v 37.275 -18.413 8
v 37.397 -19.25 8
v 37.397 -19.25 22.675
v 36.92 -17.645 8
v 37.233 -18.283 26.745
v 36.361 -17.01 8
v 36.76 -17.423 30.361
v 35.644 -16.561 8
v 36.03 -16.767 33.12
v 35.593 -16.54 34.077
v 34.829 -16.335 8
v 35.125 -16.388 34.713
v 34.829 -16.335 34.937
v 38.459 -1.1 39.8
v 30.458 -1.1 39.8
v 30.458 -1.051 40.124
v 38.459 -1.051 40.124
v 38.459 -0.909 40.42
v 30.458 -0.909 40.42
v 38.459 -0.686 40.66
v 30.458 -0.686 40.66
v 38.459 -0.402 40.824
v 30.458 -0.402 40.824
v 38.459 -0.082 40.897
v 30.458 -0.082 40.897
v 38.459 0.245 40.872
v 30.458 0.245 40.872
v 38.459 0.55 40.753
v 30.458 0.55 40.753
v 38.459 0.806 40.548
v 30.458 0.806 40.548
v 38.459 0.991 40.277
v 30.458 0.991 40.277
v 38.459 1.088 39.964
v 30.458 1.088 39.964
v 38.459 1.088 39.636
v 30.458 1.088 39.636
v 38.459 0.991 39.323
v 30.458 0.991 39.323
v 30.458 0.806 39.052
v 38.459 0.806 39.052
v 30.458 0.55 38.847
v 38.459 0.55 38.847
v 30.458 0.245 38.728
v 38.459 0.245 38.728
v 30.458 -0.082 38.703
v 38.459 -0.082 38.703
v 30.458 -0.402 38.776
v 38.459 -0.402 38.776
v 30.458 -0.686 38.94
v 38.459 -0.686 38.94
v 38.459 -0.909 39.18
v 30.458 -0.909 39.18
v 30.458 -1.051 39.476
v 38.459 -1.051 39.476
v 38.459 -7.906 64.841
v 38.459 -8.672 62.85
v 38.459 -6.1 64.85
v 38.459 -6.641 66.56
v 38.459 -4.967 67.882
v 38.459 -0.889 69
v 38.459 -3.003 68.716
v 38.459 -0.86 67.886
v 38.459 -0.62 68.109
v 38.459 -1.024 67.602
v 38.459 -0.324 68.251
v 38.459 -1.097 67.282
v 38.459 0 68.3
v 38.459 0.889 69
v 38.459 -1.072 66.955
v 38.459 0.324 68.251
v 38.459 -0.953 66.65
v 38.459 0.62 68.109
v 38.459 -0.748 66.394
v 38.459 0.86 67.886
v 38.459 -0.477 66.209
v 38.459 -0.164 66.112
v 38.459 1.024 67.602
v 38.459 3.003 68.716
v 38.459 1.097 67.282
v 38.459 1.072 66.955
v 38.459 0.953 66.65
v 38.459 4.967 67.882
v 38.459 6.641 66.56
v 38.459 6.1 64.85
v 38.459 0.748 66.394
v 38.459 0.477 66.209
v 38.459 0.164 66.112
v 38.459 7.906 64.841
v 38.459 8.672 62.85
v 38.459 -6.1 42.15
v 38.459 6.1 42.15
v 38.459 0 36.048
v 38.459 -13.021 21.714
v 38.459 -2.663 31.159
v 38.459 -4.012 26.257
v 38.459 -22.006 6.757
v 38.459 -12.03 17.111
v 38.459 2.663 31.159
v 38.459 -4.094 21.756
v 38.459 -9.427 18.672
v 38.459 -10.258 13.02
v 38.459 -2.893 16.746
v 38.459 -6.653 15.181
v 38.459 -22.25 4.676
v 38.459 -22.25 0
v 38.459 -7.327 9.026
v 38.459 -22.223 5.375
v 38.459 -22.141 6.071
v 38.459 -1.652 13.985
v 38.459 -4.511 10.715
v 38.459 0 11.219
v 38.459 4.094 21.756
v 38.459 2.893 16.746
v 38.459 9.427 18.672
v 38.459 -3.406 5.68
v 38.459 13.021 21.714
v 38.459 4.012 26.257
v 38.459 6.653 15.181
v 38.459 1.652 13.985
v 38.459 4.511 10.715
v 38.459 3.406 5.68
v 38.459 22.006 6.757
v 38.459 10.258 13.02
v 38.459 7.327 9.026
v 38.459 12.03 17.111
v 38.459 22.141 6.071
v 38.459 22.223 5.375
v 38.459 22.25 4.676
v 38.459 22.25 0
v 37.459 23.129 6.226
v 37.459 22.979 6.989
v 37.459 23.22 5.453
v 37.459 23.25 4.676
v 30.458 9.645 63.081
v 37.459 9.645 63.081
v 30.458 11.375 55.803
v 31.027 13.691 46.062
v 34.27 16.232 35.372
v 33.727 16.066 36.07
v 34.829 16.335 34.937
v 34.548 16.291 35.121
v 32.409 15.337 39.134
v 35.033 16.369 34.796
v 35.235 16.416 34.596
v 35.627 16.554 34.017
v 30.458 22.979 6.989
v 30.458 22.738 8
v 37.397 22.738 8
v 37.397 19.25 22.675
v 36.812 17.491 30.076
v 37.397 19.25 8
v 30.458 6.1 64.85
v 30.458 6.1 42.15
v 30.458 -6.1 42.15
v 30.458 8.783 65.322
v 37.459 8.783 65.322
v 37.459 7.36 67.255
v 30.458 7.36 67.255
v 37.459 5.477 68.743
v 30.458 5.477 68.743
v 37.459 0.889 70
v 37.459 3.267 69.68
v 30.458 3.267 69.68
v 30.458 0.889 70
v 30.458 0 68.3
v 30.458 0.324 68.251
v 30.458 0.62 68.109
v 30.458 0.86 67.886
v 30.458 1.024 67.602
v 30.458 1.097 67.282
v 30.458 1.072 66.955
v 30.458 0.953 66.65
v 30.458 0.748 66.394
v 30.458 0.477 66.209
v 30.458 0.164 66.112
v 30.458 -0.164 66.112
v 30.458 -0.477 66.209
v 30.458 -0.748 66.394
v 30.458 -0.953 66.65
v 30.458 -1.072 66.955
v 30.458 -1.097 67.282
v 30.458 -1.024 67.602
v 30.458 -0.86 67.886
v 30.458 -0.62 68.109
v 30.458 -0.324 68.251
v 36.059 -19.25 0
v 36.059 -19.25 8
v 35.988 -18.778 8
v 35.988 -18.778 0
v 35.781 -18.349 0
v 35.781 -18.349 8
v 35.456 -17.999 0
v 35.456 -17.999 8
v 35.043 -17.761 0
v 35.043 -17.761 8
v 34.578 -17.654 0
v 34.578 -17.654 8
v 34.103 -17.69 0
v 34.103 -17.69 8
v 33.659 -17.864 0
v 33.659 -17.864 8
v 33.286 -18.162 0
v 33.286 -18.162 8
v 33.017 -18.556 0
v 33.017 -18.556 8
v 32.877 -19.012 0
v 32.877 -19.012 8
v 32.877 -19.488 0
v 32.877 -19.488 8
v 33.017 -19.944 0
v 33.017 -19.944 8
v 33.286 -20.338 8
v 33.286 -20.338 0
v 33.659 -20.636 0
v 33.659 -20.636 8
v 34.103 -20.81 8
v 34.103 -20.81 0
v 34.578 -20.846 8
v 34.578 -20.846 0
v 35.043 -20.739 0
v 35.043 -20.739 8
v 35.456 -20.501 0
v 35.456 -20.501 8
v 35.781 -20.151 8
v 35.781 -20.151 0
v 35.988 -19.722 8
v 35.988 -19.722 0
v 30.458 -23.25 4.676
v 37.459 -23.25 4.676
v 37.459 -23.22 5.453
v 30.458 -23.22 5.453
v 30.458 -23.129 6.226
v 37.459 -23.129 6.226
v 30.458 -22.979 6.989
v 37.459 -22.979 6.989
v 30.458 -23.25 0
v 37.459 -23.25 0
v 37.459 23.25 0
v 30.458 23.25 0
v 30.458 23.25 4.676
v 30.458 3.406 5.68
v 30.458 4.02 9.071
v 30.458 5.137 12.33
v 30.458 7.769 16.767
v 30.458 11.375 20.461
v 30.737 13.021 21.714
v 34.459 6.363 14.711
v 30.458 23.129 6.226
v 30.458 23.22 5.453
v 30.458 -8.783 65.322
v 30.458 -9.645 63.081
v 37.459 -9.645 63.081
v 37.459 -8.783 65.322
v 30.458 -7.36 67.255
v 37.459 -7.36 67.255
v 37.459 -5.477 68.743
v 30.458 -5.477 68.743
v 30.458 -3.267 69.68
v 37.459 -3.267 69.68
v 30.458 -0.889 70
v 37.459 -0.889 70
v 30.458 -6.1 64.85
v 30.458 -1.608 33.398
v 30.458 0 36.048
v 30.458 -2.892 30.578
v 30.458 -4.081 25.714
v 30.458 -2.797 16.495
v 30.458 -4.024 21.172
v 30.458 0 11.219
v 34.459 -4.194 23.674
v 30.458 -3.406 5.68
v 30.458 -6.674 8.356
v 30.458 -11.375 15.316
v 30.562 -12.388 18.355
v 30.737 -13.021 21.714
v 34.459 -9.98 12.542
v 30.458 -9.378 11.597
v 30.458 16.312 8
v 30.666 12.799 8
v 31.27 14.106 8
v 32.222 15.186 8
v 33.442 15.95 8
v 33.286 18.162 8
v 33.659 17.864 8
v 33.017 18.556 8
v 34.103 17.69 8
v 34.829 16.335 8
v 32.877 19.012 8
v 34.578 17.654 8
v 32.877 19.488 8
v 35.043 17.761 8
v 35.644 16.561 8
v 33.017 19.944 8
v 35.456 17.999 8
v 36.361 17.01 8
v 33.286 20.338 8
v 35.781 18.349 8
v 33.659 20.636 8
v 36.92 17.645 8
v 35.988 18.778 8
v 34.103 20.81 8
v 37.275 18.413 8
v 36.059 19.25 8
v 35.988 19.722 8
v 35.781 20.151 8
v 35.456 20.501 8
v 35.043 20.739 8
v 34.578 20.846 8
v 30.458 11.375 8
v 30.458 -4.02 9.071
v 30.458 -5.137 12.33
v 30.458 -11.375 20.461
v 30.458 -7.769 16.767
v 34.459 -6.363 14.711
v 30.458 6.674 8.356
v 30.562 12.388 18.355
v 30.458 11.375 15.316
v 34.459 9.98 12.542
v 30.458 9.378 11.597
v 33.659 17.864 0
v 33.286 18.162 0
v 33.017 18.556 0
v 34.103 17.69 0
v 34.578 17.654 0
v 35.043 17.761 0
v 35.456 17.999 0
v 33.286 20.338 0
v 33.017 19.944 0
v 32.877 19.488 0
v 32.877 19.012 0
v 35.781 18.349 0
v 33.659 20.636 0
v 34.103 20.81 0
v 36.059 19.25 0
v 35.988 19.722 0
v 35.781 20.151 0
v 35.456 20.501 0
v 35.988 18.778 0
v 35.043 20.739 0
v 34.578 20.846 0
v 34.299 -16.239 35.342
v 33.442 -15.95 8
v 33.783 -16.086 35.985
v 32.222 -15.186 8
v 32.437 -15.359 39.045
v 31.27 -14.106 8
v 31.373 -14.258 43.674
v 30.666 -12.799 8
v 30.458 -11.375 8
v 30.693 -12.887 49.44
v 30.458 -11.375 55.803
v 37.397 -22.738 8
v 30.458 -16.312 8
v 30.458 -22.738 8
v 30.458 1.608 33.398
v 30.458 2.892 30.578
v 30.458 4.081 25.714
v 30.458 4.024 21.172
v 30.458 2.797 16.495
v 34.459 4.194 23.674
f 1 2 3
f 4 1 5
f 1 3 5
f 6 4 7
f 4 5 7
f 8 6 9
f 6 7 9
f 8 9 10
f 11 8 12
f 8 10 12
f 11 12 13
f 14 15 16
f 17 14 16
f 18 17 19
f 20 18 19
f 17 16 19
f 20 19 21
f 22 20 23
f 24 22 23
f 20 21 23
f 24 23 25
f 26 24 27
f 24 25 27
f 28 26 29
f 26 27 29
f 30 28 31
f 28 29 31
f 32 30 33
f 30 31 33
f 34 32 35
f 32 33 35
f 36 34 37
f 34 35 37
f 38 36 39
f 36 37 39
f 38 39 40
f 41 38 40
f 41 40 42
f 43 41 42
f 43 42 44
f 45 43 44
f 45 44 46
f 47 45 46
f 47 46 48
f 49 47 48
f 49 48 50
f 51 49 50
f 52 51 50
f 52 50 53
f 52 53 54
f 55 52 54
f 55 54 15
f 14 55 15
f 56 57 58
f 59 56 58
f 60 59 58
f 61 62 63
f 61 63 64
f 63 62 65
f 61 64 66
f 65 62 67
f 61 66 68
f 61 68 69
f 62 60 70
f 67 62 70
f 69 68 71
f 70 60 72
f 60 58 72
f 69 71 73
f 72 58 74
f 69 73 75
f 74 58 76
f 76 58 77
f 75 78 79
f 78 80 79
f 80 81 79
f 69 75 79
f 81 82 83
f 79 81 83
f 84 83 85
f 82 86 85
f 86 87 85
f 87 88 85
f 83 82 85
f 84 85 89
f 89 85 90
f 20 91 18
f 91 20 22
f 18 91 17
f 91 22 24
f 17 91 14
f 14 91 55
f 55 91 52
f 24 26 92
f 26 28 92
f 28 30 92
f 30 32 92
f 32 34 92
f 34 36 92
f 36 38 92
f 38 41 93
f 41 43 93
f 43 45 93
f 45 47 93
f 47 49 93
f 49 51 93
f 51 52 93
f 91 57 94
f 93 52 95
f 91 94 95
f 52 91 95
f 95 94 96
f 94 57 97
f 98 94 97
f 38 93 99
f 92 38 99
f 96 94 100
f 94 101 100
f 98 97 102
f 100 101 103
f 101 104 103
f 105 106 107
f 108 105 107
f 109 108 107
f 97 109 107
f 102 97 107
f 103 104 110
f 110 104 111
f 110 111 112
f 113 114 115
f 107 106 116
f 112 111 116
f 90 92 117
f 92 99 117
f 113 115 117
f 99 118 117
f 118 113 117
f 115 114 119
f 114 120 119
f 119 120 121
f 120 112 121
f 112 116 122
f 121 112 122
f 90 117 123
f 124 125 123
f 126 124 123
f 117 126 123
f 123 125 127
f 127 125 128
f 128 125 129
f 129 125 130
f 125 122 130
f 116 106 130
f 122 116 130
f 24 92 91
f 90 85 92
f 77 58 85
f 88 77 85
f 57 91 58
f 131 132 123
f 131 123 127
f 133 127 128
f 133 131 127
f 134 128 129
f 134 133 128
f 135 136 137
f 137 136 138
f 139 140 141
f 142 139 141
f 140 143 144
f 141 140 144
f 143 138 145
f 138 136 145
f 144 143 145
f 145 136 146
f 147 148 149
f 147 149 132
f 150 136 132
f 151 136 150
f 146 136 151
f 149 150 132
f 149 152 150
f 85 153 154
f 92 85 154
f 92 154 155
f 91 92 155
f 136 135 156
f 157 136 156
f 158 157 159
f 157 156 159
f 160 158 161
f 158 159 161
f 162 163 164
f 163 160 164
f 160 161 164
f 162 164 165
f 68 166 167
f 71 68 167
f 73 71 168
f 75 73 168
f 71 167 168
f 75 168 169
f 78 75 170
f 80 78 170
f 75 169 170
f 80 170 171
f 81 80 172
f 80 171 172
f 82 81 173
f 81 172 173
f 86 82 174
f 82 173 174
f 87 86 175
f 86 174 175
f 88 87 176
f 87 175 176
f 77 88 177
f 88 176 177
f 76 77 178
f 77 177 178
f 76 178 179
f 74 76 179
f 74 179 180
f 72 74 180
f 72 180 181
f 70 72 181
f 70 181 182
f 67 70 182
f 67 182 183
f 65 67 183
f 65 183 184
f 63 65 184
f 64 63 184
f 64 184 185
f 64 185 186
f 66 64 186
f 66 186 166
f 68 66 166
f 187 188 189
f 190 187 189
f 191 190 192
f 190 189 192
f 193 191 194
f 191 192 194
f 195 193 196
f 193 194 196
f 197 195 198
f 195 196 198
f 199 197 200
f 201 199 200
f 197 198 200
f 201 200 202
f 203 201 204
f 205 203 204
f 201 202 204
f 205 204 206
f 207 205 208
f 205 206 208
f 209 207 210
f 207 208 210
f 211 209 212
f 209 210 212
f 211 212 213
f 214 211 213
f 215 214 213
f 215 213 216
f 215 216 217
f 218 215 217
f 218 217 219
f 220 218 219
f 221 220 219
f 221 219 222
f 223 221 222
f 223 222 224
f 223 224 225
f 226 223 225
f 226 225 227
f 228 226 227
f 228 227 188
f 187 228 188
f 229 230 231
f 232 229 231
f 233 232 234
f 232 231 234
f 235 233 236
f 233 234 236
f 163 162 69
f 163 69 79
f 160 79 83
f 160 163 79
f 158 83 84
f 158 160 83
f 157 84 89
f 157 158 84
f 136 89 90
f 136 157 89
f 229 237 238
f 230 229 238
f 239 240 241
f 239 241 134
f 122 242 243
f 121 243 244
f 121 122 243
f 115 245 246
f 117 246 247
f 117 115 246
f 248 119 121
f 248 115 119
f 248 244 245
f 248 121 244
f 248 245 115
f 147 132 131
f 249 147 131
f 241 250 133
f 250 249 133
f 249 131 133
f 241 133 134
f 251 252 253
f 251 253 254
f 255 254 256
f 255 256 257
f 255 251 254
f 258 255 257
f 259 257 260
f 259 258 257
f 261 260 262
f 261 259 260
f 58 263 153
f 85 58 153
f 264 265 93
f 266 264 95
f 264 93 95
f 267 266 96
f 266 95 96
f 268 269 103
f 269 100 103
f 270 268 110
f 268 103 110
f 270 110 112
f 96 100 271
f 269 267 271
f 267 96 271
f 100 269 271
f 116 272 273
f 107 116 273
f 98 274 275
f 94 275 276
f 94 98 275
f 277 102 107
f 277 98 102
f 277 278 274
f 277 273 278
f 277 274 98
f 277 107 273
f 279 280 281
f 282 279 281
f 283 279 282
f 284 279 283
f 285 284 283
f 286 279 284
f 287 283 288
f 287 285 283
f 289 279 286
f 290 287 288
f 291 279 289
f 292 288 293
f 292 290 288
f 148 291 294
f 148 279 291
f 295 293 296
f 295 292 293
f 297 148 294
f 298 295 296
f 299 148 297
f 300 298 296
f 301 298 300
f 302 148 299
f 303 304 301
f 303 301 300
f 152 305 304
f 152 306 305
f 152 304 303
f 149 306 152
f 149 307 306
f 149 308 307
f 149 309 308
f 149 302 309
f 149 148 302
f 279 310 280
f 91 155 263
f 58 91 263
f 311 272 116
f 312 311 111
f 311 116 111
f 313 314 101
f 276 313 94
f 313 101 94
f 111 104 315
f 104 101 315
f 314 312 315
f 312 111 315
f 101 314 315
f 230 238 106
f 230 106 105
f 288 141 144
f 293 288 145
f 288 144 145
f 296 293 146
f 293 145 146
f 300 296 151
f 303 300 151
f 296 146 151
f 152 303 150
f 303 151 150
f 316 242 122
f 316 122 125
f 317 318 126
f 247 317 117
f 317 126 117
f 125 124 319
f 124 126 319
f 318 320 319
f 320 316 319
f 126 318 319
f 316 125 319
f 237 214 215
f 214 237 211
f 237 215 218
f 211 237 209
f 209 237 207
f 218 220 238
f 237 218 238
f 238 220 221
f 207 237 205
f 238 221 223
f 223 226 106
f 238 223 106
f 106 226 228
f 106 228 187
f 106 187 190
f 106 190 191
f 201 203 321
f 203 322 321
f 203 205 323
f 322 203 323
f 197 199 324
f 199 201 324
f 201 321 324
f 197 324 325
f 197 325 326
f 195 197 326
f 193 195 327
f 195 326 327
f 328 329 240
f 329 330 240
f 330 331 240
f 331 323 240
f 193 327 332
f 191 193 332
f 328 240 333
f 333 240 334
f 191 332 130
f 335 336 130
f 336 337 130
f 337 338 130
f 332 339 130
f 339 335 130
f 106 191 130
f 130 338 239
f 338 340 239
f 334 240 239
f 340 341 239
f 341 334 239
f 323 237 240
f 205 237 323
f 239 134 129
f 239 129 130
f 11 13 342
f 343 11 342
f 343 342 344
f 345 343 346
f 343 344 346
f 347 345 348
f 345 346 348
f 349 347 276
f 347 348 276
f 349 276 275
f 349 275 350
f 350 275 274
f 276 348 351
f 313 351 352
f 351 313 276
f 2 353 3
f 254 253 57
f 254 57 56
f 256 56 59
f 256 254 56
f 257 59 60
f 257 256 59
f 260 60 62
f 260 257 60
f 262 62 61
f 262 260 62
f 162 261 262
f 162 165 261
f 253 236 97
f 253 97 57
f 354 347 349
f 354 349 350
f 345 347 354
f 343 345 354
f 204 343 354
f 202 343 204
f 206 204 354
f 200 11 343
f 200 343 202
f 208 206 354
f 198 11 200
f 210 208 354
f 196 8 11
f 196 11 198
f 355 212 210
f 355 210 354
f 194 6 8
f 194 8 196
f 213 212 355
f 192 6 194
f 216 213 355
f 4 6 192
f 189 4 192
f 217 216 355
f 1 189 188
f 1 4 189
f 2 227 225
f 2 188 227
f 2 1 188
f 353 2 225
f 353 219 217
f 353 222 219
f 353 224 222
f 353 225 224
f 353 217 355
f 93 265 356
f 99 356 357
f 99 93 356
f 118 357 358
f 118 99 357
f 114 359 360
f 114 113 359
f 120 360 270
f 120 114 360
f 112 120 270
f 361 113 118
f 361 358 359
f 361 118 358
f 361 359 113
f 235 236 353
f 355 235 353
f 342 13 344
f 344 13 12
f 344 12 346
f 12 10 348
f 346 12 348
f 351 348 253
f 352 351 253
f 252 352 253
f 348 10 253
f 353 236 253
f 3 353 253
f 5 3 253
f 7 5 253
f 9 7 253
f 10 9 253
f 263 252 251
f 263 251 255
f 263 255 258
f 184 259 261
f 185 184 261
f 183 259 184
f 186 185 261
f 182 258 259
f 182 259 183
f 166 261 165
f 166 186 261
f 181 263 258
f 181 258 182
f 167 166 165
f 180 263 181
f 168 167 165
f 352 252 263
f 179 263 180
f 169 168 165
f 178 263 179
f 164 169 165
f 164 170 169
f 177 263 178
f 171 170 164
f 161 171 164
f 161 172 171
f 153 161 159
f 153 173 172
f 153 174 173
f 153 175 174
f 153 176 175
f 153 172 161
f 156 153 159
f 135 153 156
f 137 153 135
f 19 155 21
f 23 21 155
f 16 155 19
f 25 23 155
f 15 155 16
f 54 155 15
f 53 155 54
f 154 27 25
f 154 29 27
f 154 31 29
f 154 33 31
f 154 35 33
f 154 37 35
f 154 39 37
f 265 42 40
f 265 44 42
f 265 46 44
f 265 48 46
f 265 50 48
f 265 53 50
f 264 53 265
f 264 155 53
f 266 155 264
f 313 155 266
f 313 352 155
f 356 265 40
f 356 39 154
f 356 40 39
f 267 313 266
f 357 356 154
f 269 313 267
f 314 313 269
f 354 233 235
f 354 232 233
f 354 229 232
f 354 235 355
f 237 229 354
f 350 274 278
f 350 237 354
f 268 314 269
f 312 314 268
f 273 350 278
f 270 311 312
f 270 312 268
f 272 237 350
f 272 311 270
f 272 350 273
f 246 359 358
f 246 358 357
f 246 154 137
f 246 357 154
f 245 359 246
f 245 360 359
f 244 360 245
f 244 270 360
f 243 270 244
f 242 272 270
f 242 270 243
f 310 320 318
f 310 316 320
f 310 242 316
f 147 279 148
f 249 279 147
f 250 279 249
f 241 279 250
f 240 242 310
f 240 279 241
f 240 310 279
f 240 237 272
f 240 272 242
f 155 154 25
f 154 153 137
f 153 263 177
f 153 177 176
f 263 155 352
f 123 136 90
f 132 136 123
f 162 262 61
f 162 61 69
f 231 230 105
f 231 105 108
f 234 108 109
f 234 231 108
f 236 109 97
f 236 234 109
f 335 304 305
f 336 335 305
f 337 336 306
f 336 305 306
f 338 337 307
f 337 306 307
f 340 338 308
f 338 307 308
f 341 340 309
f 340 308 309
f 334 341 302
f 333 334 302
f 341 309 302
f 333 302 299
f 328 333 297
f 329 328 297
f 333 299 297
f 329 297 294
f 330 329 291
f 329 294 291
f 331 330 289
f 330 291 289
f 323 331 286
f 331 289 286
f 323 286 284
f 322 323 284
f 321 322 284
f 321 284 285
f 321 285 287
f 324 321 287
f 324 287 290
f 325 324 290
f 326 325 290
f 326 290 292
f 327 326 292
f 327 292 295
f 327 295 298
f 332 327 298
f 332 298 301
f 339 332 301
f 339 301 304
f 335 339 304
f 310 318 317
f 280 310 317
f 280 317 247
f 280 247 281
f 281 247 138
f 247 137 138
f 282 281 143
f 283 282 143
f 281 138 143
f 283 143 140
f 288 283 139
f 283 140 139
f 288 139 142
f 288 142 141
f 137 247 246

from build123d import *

# Parameters (mm, degrees)
SKETCH1_W           = 8.000974829
SKETCH1_H           = 46.5
BOSS_EXTRUDE1_DEPTH = 70
CUT_EXTRUDE1_DEPTH  = 70
SKETCH3_R           = 1.1
CUT_EXTRUDE2_DEPTH  = 70
FILLET1_R           = 9
CUT_EXTRUDE3_DEPTH  = 62
SKETCH5_R           = 1.6
CUT_EXTRUDE4_DEPTH  = 62
FILLET2_R           = 5
CHAMFER1_SIZE       = 1


with BuildPart() as part:
    # Sketch1 → Boss-Extrude1 (new body)
    with BuildSketch(Plane.XY):
        with Locations((34.458782271, 0)):
            Rectangle(SKETCH1_W, SKETCH1_H)
    extrude(amount=BOSS_EXTRUDE1_DEPTH)

    # Sketch2 → Cut-Extrude1 (cut)
    with BuildSketch(Plane(origin=(38.459269685, 0, 0), x_dir=(0, 0, -1), z_dir=(1, 0, 0))):
        with BuildLine():
            Line((0, -23.25), (-4.675968949, -23.25))
            ThreePointArc((-4.675968949, -23.25), (-5.84025075, -23.181991134), (-6.988696254, -22.978889578))
            Line((-6.988696254, -22.978889578), (-70, -8))
            Line((-70, -8), (-70, 0))
            Line((-70, 0), (-70, 8))
            Line((-70, 8), (-6.988696254, 22.978889578))
            ThreePointArc((-6.988696254, 22.978889578), (-5.84025075, 23.181991134), (-4.675968949, 23.25))
            Line((-4.675968949, 23.25), (0, 23.25))
            Line((0, 23.25), (0, 33.462731107))
            Line((0, 33.462731107), (-74.824697051, 33.462731107))
            Line((-74.824697051, 33.462731107), (-74.824697051, -41.354226456))
            Line((-74.824697051, -41.354226456), (0, -41.354226456))
            Line((0, -41.354226456), (0, -23.25))
        make_face()
        with BuildLine():
            add(Edge.make_bspline(
                [(-36.048150351, 0), (-23.713645553, -8.388071288), (-11.218940507, 0)],
                knots=[0, 0, 0, 1, 1, 1], degree=2))
            add(Edge.make_bspline(
                [(-36.048150351, 0), (-23.713645553, 8.388071288), (-11.218940507, 0)],
                knots=[0, 0, 0, 1, 1, 1], degree=2))
        make_face()
        with BuildLine():
            add(Edge.make_bspline(
                [(-5.680368735, 3.40627966), (-15.724909711, 4.511710031), (-21.714178832, 13.021085274)],
                knots=[0, 0, 0, 1, 1, 1], degree=2))
            add(Edge.make_bspline(
                [(-5.680368735, 3.40627966), (-11.386784663, 11.746039667), (-21.714178832, 13.021085274)],
                knots=[0, 0, 0, 1, 1, 1], degree=2))
        make_face()
        with BuildLine():
            add(Edge.make_bspline(
                [(-5.680368735, -3.40627966), (-15.724909711, -4.511710031), (-21.714178832, -13.021085274)],
                knots=[0, 0, 0, 1, 1, 1], degree=2))
            add(Edge.make_bspline(
                [(-5.680368735, -3.40627966), (-11.386784663, -11.746039667), (-21.714178832, -13.021085274)],
                knots=[0, 0, 0, 1, 1, 1], degree=2))
        make_face()
    extrude(amount=-CUT_EXTRUDE1_DEPTH, mode=Mode.SUBTRACT)

    # Sketch3 → Cut-Extrude2 (cut)
    with BuildSketch(Plane.ZY.offset(-30.458294856)):
        with Locations((67.2, 0)):
            Circle(SKETCH3_R)
        with Locations(Location((39.8, 0, 0), (0, 0, 270))):
            Circle(SKETCH3_R)
        Polygon((53.5, 6.1), (42.15, 6.1), (42.15, -6.1), (64.85, -6.1), (64.85, 6.1), align=None)
    extrude(amount=-CUT_EXTRUDE2_DEPTH, mode=Mode.SUBTRACT)

    # Fillet1
    fillet1_edges = [part.edges().sort_by_distance(p)[0] for p in [
        (34.458782271, -8, 70),
        (34.458782271, 8, 70),
    ]]
    fillet(fillet1_edges, radius=FILLET1_R)

    # Sketch4 → Cut-Extrude3 (cut)
    with BuildSketch(Plane.XY.offset(70)):
        with BuildLine():
            ThreePointArc((37.397007822, -19.25), (36.536421482, -17.172360788), (34.458782271, -16.311774449))
            Line((34.458782271, -16.311774449), (30.458294856, -16.311774449))
            Line((30.458294856, -16.311774449), (30.458294856, -22.188225551))
            Line((30.458294856, -22.188225551), (30.458294856, -24.738187672))
            Line((30.458294856, -24.738187672), (37.397007822, -23.25))
            Line((37.397007822, -23.25), (37.397007822, -19.25))
        make_face()
        with BuildLine():
            Line((30.458294856, 24.500594278), (30.458294856, 22.188225551))
            Line((30.458294856, 22.188225551), (30.458294856, 16.311774449))
            Line((30.458294856, 16.311774449), (34.458782271, 16.311774449))
            ThreePointArc((34.458782271, 16.311774449), (36.536421482, 17.172360788), (37.397007822, 19.25))
            Line((37.397007822, 19.25), (37.397007822, 23.25))
            Line((37.397007822, 23.25), (30.458294856, 24.500594278))
        make_face()
    extrude(amount=-CUT_EXTRUDE3_DEPTH, mode=Mode.SUBTRACT)

    # Sketch5 → Cut-Extrude4 (cut)
    with BuildSketch(Plane.XY.offset(8)):
        with Locations((34.458782271, 19.25)):
            Circle(SKETCH5_R)
        with Locations((34.458782271, -19.25)):
            Circle(SKETCH5_R)
    extrude(amount=-CUT_EXTRUDE4_DEPTH, mode=Mode.SUBTRACT)

    # Fillet2
    # the kernel refuses this fillet: 5 mm, written as the material it takes off along each edge
    with BuildSketch(Plane(origin=(30.458294856, -16.311774449, 56.016575811), x_dir=(0, 1, 0), z_dir=(0, 0, -1))) as fillet2_piece_1:
        with BuildLine():
            CenterArc((4.936823623, 5), FILLET2_R, 187.233387323, 82.766612677)
            Line((-0.023383871, 4.37044332), (-0.519404621, 4.307487652))
            ThreePointArc((-0.519404621, 4.307487652), (-0.5, 4.000487415), (-0.5, 0))
            Line((-0.5, 0), (0, -0.5))
            Line((0, -0.5), (4.936823623, -0.5))
            Line((4.936823623, -0.5), (4.936823623, 0))
        make_face()
    extrude(amount=48.016575811, mode=Mode.SUBTRACT)
    with BuildSketch(Plane(origin=(30.458294856, 16.311774449, 56.016575811), x_dir=(0, -1, 0), z_dir=(0, 0, -1))) as fillet2_piece_2:
        with BuildLine():
            CenterArc((4.936823623, -5), FILLET2_R, 90, 82.766612677)
            Line((-0.023383871, -4.37044332), (-0.519404621, -4.307487652))
            ThreePointArc((-0.519404621, -4.307487652), (-0.5, -4.000487415), (-0.5, 0))
            Line((-0.5, 0), (0, 0.5))
            Line((0, 0.5), (4.936823623, 0.5))
            Line((4.936823623, 0.5), (4.936823623, 0))
        make_face()
    extrude(amount=48.016575811, mode=Mode.SUBTRACT)

    # Chamfer1
    chamfer1_edges = [part.edges().sort_by_distance(p)[0] for p in [
        (38.459269685, 16.311774449, 35.035075414),
        (38.459269685, 0, 70),
        (38.459269685, -6.468394753, 68.061624854),
        (38.459269685, 6.468394753, 68.061624854),
        (38.459269685, 23.25, 2.337984474),
        (38.459269685, -23.25, 2.337984474),
        (38.459269685, -23.181991134, 5.84025075),
        (38.459269685, -16.311774449, 35.035075414),
        (38.459269685, 23.181991134, 5.84025075),
    ]]
    chamfer(chamfer1_edges, length=CHAMFER1_SIZE)


solid = part.part
